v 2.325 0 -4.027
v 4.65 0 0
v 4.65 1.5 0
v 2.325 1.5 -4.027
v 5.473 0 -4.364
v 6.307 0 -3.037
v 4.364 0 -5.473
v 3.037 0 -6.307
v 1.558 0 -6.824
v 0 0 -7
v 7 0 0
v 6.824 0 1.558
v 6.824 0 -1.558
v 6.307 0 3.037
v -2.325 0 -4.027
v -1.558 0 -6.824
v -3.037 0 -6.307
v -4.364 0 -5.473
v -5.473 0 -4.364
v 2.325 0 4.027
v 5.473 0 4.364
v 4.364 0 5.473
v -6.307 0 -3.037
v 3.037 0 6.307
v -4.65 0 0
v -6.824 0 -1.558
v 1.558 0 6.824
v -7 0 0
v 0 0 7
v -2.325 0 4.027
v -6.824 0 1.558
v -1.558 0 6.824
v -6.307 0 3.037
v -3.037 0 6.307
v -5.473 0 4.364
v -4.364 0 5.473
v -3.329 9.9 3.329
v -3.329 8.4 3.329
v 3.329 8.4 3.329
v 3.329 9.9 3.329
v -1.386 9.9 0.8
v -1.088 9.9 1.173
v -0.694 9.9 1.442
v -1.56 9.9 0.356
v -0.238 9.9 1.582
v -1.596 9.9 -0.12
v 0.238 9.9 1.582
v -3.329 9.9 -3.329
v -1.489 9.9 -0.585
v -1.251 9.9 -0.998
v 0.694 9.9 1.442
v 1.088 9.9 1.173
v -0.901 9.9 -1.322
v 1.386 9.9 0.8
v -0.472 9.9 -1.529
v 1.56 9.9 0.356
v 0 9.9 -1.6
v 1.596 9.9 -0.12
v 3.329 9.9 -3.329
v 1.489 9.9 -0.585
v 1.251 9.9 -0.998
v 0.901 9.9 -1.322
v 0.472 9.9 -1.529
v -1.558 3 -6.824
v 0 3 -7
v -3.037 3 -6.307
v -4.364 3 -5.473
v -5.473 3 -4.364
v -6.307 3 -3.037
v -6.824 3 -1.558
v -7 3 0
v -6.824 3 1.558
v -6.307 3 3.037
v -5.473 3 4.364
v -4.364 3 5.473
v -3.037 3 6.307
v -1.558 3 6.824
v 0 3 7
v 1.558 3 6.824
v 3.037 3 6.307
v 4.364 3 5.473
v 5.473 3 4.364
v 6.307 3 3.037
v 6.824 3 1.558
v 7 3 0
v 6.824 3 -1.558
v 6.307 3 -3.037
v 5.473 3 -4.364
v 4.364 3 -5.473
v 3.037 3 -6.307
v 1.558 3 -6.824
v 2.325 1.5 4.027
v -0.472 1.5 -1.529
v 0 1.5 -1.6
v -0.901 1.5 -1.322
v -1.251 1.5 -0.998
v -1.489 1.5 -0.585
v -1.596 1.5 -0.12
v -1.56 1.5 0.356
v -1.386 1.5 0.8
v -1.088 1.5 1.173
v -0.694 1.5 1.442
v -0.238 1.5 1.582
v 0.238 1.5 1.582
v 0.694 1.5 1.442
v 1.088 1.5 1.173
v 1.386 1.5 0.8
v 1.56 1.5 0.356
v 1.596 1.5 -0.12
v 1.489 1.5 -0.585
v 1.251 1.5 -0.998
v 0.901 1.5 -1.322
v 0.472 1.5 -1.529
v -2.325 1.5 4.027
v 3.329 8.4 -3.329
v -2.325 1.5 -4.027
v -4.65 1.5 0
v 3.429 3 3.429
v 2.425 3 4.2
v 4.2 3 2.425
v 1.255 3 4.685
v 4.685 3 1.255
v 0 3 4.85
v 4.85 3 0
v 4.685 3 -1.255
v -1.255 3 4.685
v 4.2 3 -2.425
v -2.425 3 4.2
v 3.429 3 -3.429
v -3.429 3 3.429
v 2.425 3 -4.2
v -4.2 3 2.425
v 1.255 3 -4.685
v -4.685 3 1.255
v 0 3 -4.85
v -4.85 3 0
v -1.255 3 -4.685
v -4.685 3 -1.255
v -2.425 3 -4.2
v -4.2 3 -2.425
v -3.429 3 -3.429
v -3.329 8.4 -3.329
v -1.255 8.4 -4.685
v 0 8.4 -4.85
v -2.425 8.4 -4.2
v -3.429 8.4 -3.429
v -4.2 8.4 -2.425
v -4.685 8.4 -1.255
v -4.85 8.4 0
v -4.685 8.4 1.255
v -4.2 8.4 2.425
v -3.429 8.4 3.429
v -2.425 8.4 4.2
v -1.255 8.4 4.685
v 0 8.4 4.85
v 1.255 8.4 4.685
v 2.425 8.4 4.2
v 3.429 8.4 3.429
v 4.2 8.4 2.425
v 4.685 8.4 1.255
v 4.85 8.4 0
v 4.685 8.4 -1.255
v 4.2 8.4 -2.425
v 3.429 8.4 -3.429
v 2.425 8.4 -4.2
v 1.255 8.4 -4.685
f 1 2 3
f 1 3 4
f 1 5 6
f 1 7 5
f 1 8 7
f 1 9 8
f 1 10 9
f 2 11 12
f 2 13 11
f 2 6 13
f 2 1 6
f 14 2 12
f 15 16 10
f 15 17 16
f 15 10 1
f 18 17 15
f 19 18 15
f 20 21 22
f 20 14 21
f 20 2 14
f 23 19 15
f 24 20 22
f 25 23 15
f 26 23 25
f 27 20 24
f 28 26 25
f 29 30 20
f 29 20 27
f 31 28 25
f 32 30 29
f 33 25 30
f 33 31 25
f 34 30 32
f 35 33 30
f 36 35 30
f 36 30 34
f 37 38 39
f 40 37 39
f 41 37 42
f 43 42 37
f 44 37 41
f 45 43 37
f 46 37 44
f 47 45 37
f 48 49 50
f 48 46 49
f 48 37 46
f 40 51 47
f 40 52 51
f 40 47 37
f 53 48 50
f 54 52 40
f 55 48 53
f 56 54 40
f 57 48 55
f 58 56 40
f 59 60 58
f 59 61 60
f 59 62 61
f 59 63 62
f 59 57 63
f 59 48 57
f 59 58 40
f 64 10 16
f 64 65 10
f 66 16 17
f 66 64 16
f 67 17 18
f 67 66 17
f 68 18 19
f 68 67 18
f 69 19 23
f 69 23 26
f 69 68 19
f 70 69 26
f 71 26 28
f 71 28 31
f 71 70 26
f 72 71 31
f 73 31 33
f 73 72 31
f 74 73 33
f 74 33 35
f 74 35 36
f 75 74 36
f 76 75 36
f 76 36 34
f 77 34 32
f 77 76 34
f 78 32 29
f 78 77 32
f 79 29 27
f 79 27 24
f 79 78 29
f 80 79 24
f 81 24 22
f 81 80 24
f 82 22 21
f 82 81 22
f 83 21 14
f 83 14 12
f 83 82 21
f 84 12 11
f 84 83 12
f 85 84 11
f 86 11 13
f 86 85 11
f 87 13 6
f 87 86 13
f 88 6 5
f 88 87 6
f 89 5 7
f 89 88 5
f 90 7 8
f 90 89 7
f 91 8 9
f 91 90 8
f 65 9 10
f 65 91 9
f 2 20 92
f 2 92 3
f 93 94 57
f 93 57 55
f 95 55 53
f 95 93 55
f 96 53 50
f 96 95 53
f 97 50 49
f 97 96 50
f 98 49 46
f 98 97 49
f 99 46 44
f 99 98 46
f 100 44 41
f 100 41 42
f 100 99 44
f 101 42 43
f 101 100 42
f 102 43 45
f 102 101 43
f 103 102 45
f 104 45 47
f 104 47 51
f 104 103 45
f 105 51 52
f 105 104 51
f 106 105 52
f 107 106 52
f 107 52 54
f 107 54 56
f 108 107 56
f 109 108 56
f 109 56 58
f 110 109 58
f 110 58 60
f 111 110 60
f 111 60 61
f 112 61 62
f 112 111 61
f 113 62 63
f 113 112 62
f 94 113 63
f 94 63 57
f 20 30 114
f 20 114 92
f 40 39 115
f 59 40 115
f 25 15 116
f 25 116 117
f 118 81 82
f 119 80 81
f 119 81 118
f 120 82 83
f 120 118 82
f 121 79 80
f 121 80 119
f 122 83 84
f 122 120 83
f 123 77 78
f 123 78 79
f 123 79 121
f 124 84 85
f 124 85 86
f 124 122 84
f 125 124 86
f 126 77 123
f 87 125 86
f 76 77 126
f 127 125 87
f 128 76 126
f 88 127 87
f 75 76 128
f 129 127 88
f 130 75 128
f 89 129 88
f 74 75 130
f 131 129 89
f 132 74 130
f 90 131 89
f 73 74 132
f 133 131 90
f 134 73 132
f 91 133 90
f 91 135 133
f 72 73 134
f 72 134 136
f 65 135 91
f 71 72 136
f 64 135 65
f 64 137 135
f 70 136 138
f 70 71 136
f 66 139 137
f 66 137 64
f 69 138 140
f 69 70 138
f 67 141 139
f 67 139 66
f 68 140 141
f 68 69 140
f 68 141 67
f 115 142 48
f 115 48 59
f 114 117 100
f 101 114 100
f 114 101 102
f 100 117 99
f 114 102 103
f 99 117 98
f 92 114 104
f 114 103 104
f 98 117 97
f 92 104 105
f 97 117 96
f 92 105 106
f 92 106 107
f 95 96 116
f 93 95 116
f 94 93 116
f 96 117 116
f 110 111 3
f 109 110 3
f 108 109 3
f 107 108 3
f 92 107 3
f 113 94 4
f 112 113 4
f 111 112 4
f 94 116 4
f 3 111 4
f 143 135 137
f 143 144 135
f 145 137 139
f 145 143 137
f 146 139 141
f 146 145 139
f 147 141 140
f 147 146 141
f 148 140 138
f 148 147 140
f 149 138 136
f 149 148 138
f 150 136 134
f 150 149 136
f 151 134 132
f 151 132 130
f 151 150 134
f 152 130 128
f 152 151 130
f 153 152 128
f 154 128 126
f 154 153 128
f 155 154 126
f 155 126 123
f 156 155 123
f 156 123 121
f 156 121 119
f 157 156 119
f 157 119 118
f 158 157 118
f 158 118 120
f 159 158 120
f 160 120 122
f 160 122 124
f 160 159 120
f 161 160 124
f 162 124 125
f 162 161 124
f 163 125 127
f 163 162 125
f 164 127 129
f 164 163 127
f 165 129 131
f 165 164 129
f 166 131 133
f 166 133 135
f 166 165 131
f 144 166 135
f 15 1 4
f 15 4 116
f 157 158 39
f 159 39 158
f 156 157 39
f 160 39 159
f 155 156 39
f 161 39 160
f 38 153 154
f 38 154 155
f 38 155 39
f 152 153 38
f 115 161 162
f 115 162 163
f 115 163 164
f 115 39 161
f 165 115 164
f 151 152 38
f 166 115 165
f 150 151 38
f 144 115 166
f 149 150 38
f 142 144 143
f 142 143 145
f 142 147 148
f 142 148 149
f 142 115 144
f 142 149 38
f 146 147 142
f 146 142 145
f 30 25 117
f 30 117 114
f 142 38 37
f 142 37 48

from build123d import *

# Parameters (mm, degrees)
CROQUIS2_W              = 6.658935778
CROQUIS2_H              = 6.658935778
CROQUIS2_R              = 1.6
SALIENTE_EXTRUIR1_DEPTH = 1.5
CORTAR_EXTRUIR1_DEPTH   = 1.5


with BuildPart() as part:
    # Croquis1 → Revolución1 (revolve)
    with BuildSketch(Plane.XY, mode=Mode.PRIVATE) as revoluci_n1_sk:
        Polygon((1.6, 0), (7, 0), (7, 3), (4.85, 3), (4.85, 8.4), (1.6, 8.4), align=None)
    revolve(revoluci_n1_sk.sketch.rotate(Axis((0, -1000, 0), (0, 1, 0)), 90), axis=Axis((0, -1000, 0), (0, 1, 0)))

    # Croquis2 → Saliente-Extruir1 (add)
    with BuildSketch(Plane(origin=(0, 8.4, 0), x_dir=(1, 0, 0), z_dir=(0, 1, 0))):
        Rectangle(CROQUIS2_W, CROQUIS2_H)
        with Locations(Location((0, 0, 0), (0, 0, 90))):
            Circle(CROQUIS2_R, mode=Mode.SUBTRACT)
    extrude(amount=SALIENTE_EXTRUIR1_DEPTH)

    # Croquis3 → Cortar-Extruir1 (cut)
    with BuildSketch(Plane(origin=(0, 0, 0), x_dir=(1, 0, 0), z_dir=(0, 1, 0))):
        Polygon((4.65, 0), (2.325, 4.027018128), (-2.325, 4.027018128), (-4.65, 0), (-2.325, -4.027018128), (2.325, -4.027018128), align=None)
    extrude(amount=CORTAR_EXTRUIR1_DEPTH, mode=Mode.SUBTRACT)


solid = part.part
